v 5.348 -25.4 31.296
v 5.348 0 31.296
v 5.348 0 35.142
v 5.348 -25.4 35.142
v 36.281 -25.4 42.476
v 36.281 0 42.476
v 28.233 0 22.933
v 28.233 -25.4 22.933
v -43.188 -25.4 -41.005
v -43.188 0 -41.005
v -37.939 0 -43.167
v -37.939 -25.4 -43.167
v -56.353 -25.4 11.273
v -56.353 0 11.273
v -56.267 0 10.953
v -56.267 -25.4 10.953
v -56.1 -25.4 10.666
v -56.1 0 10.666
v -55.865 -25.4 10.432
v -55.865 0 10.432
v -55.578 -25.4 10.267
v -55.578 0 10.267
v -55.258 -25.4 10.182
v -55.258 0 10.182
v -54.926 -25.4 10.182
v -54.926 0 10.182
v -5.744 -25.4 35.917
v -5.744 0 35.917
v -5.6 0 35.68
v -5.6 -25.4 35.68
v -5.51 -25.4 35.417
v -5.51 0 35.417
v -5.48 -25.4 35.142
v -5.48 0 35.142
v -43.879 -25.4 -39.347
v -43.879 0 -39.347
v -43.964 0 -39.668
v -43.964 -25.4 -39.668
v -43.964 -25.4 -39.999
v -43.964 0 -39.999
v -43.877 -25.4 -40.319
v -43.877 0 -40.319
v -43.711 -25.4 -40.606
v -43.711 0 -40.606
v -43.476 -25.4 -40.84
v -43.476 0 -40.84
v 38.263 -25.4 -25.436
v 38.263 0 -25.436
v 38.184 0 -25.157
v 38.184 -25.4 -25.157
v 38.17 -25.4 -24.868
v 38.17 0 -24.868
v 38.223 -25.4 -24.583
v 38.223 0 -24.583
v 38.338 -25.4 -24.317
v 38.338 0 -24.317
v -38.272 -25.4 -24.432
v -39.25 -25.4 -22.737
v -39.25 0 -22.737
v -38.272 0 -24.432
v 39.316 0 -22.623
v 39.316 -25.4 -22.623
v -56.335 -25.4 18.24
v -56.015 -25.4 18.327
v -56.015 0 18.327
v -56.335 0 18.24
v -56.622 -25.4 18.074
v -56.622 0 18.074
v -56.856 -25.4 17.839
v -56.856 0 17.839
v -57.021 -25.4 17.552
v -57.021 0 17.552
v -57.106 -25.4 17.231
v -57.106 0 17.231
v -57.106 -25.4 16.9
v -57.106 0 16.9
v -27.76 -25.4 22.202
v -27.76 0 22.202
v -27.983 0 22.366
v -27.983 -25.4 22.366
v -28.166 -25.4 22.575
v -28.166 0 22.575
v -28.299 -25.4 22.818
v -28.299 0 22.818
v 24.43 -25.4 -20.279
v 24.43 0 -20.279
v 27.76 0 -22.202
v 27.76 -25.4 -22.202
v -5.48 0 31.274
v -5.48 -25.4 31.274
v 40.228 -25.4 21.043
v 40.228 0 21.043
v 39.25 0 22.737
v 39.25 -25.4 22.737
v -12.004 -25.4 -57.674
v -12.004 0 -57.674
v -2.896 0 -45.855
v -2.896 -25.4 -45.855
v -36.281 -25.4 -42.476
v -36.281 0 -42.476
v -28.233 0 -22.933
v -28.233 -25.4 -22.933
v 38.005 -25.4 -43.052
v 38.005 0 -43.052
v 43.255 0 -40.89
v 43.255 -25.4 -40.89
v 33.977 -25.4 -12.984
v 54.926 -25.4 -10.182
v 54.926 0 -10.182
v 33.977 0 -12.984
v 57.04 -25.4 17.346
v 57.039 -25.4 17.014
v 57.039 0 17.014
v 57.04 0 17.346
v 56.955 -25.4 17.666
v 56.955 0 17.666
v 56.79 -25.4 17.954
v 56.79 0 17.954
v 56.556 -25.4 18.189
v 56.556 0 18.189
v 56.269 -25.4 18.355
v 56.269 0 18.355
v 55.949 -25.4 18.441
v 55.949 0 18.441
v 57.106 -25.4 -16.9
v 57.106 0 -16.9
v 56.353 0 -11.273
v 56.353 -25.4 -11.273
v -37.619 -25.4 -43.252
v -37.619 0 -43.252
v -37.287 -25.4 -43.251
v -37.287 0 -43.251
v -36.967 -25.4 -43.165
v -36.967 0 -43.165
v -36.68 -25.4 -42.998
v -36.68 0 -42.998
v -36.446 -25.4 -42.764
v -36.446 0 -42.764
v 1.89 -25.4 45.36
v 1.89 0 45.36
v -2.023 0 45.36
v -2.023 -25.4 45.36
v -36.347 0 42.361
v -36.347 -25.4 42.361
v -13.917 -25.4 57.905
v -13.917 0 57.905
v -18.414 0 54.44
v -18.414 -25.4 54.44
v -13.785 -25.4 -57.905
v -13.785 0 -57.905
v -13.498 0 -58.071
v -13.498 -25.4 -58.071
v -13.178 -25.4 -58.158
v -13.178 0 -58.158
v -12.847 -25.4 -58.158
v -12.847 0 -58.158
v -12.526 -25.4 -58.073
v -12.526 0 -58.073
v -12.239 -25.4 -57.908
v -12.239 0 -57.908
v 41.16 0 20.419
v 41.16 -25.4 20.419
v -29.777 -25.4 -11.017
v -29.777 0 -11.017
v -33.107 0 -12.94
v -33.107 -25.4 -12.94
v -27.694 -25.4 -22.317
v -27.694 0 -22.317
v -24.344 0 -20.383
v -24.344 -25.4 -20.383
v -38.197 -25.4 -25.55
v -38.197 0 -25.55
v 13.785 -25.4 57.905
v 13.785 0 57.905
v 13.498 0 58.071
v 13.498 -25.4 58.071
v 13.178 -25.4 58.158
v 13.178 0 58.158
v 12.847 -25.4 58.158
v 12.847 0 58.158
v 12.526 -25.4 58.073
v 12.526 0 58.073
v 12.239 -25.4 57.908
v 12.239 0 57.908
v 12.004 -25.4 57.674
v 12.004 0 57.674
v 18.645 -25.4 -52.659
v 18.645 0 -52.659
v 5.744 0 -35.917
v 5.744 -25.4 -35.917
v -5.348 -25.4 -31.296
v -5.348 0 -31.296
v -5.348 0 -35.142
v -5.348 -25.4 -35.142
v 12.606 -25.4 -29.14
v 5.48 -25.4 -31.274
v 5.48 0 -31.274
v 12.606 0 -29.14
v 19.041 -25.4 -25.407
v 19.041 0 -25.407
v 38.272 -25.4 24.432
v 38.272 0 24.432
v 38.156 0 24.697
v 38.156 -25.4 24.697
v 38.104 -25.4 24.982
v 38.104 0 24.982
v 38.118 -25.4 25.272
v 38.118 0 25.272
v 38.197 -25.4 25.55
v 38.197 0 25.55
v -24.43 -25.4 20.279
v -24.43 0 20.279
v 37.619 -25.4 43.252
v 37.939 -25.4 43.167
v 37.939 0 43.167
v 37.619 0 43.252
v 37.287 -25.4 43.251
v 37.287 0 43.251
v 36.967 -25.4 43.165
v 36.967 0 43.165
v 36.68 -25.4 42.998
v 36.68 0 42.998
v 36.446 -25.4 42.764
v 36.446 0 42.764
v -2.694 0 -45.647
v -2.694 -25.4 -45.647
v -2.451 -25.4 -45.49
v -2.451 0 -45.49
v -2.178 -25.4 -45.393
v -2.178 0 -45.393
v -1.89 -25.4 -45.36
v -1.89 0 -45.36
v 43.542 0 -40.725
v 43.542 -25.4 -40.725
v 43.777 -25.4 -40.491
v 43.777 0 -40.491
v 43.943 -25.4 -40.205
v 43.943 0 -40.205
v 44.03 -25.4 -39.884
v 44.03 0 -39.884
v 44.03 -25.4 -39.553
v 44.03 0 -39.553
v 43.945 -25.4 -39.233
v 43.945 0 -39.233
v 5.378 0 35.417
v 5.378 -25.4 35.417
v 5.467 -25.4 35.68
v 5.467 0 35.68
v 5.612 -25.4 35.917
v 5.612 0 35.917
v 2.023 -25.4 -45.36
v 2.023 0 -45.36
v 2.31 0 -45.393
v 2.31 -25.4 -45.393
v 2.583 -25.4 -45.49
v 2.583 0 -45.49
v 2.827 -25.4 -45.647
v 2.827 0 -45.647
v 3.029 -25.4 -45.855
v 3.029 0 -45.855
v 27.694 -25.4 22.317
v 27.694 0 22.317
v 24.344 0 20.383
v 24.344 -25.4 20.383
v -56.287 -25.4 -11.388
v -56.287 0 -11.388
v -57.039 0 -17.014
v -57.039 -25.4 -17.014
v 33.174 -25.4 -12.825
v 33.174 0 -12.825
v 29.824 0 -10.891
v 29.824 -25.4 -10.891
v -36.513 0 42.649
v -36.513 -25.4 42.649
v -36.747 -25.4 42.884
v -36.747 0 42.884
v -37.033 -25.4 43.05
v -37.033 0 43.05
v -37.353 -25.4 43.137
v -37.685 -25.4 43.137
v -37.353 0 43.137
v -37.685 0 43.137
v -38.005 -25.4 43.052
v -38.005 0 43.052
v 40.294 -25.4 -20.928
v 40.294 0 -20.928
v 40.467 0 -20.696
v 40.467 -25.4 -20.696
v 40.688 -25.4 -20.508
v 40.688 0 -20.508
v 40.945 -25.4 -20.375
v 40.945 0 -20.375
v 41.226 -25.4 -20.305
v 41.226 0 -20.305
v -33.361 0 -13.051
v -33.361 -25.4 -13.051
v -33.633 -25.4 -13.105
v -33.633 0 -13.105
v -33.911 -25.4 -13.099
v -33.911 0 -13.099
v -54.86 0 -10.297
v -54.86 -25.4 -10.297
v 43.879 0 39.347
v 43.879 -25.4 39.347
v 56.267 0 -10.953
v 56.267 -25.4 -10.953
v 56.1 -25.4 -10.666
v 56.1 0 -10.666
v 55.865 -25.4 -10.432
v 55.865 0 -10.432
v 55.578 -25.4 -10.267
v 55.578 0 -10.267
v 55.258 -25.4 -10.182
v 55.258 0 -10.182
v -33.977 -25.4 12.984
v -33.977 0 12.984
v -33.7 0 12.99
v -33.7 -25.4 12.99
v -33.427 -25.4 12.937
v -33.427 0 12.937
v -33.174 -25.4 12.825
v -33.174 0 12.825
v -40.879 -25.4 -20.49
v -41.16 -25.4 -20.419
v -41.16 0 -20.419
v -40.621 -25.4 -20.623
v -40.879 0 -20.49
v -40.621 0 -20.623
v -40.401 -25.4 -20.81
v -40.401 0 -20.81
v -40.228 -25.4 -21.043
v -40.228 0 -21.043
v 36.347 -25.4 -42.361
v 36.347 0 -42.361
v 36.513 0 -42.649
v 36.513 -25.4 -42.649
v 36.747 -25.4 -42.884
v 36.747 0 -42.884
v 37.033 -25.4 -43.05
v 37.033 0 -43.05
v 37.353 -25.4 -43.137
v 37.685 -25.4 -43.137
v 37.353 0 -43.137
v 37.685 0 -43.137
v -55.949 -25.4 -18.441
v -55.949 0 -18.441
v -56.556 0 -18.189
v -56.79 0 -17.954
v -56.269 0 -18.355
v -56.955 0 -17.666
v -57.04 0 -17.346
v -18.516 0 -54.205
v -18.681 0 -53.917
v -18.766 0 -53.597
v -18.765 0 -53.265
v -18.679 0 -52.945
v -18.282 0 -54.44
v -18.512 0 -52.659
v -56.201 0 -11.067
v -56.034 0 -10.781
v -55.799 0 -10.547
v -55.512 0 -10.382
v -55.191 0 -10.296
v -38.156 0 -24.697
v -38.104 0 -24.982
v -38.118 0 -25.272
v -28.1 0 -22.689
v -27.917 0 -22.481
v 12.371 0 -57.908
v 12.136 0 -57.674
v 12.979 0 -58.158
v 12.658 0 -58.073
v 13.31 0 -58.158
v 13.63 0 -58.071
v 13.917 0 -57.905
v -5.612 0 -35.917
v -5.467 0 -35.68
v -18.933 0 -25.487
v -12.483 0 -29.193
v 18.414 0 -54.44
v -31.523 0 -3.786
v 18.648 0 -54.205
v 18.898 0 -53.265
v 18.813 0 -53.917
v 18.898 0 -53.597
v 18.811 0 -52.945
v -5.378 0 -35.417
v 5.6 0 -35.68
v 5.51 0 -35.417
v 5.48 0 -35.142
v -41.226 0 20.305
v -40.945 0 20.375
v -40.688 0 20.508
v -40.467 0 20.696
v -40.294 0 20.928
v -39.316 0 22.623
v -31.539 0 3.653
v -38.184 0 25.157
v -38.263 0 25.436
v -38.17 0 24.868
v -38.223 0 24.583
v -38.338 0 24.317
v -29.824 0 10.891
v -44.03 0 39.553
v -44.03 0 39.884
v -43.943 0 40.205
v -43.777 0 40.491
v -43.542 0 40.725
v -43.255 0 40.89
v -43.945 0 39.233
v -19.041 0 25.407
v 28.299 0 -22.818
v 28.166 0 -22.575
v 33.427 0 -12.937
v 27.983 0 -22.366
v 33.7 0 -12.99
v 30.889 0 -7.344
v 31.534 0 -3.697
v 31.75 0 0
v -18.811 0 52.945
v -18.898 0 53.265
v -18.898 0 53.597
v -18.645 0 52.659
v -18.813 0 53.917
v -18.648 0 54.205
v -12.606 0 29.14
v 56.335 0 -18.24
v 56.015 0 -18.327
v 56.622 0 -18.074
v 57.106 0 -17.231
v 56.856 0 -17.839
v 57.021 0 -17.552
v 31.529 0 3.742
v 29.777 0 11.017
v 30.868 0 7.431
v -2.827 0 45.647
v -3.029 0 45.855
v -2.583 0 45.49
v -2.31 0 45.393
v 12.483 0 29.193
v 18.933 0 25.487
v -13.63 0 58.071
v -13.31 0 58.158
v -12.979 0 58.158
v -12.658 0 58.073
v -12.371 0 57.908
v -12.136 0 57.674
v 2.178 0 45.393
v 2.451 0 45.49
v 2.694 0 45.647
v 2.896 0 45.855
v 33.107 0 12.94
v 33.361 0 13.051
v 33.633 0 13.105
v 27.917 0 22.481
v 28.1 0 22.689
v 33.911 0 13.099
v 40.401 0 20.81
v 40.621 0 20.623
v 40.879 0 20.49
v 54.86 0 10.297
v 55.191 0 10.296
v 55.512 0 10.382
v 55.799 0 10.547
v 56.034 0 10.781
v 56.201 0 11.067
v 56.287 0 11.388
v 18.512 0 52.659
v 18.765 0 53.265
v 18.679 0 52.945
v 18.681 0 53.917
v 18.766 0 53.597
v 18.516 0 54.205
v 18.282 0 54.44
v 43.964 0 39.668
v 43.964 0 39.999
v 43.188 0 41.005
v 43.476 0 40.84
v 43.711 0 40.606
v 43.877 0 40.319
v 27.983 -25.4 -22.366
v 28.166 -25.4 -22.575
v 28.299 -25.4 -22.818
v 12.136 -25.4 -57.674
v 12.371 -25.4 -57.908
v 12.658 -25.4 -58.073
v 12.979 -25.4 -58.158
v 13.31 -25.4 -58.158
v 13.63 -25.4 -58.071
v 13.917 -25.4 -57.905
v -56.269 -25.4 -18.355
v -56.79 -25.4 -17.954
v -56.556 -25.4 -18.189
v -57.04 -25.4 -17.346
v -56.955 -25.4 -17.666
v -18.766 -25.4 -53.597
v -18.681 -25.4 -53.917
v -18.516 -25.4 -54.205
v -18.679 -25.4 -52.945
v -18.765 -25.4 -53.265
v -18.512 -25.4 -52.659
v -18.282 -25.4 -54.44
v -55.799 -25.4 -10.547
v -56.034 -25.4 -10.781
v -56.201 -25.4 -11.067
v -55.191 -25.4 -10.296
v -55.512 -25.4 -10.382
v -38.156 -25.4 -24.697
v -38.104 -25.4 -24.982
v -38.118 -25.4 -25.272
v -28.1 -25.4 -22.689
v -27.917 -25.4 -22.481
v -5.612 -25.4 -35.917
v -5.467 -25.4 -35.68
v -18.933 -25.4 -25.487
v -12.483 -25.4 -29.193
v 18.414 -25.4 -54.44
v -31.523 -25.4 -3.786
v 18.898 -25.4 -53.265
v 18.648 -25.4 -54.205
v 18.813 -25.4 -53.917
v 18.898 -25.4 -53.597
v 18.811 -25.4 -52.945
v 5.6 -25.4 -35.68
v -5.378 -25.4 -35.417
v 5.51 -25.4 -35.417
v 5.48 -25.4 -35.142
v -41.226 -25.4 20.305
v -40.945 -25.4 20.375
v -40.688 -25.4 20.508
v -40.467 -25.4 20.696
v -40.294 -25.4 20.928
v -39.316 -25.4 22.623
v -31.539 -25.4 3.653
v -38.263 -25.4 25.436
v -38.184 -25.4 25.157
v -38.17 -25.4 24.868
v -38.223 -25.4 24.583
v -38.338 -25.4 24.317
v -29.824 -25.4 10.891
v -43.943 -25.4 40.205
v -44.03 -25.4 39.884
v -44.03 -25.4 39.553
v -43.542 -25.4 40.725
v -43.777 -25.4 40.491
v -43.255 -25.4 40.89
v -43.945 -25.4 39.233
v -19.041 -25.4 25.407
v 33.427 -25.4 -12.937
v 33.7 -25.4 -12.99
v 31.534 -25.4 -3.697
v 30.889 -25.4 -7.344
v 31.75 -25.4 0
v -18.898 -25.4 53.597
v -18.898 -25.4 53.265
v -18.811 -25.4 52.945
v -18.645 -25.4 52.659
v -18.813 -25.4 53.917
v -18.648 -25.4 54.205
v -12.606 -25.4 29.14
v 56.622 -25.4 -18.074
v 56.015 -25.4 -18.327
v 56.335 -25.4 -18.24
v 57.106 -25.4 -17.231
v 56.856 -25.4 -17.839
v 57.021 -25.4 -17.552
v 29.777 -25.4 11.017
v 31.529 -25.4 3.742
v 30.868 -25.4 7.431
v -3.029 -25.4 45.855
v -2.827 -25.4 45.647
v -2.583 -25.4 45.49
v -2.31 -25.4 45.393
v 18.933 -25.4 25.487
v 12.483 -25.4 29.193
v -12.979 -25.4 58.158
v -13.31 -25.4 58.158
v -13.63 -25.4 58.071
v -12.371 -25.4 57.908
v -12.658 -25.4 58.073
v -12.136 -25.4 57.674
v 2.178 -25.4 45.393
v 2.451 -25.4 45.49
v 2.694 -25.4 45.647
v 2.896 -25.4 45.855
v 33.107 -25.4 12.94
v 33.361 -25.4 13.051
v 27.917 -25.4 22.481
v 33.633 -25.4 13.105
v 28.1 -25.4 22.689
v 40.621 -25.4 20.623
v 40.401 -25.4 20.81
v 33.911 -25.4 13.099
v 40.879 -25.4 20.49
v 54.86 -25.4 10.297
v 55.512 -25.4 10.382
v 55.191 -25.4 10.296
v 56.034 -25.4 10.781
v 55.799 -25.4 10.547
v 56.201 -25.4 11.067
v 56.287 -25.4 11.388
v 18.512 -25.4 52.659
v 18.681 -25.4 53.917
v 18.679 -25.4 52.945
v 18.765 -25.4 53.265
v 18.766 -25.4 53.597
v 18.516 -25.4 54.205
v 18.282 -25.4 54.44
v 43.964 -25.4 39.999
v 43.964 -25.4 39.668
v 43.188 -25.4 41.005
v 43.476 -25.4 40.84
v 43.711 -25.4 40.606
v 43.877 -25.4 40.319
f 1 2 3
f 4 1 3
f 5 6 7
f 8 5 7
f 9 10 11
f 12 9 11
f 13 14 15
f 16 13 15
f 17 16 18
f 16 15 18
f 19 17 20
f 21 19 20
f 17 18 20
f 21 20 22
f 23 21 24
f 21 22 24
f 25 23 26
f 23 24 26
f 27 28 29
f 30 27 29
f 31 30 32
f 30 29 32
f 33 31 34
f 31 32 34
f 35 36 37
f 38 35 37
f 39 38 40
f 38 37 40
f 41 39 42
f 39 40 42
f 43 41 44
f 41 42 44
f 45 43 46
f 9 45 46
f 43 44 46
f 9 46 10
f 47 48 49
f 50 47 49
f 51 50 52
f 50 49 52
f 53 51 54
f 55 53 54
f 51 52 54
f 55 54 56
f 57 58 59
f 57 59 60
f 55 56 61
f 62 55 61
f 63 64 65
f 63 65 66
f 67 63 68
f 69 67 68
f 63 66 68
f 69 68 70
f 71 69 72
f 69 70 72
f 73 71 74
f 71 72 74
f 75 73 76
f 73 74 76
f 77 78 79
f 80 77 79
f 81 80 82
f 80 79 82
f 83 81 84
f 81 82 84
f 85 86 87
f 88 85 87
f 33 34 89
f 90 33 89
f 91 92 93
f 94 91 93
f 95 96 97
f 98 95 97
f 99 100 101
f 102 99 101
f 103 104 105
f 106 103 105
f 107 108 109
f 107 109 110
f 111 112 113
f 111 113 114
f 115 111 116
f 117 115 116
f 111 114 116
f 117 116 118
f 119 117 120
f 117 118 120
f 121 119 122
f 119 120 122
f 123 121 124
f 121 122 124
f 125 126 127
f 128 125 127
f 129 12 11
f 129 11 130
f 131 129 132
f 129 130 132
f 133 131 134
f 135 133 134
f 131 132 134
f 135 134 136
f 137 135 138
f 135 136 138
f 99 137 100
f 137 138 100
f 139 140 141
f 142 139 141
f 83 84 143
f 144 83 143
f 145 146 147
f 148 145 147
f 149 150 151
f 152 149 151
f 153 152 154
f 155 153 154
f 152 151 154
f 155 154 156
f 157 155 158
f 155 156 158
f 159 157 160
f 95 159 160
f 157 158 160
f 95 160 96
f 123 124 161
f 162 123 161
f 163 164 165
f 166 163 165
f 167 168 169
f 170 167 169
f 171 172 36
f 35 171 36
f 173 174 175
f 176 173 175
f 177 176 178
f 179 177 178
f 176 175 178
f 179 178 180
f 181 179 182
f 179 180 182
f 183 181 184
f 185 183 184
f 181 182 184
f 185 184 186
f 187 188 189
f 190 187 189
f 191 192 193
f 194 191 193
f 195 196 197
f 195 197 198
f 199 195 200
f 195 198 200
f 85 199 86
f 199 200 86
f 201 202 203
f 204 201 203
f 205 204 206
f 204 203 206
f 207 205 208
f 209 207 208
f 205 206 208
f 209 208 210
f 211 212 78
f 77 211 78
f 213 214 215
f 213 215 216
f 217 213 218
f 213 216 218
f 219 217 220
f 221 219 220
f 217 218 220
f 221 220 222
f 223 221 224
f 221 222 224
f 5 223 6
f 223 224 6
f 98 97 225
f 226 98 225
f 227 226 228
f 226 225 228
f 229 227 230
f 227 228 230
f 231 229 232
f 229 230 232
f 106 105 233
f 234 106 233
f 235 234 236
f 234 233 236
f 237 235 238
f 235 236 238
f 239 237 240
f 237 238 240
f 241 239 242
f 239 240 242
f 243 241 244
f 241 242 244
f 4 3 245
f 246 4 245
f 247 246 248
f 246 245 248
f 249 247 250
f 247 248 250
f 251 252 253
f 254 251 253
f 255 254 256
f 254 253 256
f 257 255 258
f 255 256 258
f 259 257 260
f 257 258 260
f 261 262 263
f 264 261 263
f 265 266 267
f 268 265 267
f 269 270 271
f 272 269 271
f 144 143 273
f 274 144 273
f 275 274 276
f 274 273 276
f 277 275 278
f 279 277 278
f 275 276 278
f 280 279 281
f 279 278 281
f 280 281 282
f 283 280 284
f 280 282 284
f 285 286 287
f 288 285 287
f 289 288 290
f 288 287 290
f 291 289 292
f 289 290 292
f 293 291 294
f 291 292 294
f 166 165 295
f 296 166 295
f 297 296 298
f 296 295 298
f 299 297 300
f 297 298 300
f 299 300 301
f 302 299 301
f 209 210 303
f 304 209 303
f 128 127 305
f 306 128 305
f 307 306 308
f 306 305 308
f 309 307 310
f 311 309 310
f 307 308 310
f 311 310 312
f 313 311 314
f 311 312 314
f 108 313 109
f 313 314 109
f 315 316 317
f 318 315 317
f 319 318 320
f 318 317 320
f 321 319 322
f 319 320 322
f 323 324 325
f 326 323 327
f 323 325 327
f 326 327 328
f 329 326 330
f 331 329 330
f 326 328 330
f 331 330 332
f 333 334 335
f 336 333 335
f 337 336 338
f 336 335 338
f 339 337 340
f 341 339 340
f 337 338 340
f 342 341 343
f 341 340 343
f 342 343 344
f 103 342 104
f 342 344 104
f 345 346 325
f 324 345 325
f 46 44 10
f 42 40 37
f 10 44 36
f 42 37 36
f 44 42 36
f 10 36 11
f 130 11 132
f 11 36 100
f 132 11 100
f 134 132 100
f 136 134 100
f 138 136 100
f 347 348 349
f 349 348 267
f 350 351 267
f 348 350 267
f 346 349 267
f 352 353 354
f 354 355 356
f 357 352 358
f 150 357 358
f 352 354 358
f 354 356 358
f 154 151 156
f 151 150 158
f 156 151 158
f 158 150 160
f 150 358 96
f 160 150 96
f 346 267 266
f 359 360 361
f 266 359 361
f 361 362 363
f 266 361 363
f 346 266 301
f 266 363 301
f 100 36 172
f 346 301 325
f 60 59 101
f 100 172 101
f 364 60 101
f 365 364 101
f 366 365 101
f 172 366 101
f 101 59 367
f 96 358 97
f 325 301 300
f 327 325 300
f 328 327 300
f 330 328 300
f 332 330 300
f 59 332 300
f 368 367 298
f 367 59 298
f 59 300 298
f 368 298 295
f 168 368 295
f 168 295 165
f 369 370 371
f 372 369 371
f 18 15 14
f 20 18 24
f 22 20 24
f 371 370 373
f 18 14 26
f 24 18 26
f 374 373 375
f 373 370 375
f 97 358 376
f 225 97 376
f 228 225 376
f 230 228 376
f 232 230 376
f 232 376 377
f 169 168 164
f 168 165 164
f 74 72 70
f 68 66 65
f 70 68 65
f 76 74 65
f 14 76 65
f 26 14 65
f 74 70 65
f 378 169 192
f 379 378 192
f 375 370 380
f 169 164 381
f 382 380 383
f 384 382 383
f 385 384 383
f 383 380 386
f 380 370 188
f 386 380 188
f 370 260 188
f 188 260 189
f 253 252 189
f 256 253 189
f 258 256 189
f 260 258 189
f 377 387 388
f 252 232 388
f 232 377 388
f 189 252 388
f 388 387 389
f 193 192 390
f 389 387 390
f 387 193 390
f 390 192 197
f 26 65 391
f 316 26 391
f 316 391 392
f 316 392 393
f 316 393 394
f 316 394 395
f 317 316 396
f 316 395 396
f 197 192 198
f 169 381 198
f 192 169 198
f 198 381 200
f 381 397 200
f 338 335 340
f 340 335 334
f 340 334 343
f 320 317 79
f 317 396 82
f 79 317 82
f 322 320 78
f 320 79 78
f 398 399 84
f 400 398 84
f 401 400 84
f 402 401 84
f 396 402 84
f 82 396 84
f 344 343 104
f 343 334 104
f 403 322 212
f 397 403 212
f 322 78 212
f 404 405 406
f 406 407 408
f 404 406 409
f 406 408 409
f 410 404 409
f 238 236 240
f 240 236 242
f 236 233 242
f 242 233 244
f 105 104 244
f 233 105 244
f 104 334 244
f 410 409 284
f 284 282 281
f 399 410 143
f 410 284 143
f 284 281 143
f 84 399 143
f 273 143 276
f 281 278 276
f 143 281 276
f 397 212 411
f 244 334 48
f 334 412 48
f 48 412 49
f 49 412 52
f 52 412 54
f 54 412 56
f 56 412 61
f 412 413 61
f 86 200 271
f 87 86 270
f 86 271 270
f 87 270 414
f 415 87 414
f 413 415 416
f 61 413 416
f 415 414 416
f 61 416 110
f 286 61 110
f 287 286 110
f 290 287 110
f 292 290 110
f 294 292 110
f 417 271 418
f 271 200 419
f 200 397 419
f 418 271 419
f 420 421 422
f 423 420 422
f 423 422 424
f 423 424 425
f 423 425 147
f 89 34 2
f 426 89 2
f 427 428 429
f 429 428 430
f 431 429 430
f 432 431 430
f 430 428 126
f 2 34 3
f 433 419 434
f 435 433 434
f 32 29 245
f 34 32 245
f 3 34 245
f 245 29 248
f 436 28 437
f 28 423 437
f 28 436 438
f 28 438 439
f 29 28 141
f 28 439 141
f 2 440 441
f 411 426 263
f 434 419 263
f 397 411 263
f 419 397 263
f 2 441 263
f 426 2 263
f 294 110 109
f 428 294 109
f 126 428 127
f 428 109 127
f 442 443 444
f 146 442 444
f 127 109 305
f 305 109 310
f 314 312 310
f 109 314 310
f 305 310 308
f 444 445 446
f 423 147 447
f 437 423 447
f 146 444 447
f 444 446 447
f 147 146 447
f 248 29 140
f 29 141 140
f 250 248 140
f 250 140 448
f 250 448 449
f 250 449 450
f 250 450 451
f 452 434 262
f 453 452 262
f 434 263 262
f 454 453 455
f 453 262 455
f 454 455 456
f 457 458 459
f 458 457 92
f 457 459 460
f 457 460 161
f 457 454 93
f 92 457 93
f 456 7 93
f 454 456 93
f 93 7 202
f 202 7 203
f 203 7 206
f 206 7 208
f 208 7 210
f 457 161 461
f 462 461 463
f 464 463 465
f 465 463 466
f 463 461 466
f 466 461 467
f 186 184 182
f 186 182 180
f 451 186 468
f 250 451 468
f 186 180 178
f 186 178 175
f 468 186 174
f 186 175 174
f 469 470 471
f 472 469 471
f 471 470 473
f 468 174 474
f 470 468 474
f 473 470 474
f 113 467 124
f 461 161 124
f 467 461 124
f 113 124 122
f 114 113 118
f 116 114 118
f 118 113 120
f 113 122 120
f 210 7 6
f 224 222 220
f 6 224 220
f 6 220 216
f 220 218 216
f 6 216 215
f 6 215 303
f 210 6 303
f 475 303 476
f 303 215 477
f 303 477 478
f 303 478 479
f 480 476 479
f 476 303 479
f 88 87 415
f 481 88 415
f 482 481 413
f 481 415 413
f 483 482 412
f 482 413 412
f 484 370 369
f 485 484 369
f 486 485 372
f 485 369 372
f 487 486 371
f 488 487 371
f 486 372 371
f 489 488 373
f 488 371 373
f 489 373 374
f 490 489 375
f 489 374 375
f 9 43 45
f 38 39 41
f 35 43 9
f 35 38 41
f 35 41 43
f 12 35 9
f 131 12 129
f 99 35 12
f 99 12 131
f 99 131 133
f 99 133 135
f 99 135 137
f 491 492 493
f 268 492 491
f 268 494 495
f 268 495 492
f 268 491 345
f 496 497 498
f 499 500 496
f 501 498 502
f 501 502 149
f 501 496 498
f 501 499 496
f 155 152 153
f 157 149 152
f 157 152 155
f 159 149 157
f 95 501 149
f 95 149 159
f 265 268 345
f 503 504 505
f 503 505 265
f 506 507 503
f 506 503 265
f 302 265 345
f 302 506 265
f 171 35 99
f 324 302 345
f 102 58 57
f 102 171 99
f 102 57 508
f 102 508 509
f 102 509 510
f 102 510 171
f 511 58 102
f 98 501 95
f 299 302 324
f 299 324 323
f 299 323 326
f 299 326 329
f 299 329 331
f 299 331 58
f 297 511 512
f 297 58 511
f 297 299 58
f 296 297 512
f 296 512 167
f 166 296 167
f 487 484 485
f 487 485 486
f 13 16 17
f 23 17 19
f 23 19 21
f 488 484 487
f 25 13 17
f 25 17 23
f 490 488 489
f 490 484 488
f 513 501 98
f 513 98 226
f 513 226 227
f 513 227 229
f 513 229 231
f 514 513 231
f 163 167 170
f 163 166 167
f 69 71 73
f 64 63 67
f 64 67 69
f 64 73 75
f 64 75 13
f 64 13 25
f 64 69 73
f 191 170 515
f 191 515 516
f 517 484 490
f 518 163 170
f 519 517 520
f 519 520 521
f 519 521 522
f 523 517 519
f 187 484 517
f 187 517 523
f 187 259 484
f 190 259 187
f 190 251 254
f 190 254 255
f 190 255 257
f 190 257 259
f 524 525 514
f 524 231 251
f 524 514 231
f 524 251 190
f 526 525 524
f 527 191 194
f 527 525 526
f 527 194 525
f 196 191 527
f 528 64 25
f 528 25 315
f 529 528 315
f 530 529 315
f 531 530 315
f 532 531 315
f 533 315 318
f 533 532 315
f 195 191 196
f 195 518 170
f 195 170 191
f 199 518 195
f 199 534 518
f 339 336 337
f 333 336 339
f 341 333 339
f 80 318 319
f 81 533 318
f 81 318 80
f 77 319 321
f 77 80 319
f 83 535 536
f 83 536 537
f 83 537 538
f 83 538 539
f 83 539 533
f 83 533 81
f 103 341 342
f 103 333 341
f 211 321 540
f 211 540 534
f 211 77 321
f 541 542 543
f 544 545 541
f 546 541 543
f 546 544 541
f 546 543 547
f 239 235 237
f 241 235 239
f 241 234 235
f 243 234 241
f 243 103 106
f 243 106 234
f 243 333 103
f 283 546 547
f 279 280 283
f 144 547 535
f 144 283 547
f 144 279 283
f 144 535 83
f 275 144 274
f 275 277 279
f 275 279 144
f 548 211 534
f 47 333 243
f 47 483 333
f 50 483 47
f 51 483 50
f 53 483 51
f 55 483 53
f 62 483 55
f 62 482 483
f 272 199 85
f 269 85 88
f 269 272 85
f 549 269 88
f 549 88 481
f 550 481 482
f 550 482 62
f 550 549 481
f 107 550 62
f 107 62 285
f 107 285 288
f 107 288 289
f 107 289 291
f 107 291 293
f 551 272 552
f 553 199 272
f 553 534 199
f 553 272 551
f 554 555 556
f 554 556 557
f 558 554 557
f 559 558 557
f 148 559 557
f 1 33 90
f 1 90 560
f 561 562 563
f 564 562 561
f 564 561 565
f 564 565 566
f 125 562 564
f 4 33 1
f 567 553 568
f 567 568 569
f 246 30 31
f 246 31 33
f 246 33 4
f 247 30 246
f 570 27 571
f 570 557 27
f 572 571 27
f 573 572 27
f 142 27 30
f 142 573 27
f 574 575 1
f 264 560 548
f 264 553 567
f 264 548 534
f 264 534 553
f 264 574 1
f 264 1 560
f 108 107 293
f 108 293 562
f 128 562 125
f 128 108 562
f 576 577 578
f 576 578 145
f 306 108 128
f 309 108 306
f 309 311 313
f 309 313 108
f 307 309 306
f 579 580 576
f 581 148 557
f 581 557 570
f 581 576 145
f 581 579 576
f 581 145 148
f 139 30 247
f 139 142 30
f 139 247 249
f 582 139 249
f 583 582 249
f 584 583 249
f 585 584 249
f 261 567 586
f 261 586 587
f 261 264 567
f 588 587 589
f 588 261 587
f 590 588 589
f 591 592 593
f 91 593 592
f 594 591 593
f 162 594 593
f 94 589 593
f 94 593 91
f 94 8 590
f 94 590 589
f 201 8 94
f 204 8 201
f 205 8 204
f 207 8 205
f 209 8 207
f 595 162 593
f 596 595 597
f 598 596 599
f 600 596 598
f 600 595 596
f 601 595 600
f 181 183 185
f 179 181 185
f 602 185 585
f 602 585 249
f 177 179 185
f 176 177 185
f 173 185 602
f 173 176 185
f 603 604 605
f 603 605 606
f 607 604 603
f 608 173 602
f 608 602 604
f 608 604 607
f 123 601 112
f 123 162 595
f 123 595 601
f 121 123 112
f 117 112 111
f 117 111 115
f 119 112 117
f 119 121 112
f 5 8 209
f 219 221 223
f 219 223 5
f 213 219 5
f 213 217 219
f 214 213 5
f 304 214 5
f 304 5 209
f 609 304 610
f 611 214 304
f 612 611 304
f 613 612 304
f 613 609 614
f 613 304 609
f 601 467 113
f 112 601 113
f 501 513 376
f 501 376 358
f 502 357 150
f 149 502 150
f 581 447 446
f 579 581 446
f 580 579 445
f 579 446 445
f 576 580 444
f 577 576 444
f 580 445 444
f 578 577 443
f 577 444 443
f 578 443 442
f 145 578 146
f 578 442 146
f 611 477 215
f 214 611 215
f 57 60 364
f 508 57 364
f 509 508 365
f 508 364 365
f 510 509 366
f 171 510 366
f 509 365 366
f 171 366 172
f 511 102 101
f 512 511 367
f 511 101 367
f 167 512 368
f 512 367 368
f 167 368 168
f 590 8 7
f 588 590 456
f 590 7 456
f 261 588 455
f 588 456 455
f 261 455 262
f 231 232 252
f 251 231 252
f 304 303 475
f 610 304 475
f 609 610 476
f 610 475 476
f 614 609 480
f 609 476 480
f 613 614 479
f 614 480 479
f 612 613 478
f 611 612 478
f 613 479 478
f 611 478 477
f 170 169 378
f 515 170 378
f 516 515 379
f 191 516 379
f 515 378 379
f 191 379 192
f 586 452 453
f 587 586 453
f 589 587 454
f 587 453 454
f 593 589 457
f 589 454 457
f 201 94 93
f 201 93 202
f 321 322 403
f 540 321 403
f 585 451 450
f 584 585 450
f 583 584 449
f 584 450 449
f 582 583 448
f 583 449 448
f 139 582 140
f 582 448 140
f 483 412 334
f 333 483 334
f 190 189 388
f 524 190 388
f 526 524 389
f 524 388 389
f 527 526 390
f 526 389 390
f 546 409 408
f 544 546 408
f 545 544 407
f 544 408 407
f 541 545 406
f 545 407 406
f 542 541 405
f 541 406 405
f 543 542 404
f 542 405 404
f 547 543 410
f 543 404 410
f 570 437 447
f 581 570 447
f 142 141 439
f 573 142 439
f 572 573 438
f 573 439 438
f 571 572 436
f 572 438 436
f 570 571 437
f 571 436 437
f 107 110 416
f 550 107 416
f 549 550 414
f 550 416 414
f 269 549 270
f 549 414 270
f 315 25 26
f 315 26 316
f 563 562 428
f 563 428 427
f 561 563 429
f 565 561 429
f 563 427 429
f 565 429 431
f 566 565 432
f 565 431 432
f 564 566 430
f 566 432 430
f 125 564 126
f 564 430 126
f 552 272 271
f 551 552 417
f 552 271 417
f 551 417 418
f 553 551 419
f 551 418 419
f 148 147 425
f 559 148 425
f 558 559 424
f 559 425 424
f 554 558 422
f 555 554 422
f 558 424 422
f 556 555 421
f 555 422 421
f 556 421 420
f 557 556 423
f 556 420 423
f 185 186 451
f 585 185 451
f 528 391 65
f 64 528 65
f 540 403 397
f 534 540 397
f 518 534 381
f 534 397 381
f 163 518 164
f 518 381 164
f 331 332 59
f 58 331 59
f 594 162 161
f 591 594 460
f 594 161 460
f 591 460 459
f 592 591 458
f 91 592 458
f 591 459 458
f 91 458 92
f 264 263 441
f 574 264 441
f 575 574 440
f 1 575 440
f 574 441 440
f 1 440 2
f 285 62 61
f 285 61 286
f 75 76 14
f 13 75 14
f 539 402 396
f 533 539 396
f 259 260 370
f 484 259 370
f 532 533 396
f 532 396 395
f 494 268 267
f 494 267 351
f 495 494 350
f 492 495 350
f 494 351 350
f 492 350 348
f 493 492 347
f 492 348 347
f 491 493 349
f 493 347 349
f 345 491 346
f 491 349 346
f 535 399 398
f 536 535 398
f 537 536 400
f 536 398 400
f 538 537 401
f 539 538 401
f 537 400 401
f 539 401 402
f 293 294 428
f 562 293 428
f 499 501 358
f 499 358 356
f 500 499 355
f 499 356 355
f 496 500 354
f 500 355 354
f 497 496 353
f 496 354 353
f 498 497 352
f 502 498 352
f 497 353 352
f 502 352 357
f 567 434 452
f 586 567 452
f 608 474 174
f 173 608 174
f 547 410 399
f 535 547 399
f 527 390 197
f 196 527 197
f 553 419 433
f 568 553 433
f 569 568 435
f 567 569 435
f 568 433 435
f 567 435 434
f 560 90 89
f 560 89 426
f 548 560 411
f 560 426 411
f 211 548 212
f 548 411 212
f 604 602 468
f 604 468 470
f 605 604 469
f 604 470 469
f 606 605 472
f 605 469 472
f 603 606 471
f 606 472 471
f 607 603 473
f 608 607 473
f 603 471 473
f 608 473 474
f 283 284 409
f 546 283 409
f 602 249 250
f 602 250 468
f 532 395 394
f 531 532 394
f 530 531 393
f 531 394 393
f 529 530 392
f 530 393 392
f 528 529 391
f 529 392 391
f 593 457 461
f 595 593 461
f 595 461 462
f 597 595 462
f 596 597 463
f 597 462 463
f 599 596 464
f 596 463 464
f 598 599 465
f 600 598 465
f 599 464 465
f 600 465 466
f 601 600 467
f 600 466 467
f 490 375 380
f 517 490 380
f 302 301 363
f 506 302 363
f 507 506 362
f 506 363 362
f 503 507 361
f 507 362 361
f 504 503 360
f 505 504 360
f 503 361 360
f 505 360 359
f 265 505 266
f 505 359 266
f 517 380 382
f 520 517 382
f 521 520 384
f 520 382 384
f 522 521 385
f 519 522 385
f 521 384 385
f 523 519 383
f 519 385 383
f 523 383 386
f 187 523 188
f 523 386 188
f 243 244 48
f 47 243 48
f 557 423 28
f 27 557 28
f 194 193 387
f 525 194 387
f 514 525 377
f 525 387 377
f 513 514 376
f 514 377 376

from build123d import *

# Parameters (mm, degrees)
F1_DEPTH = 25.4


# Not quite as in the source:
# - a feature names something its author has since deleted; it is built from what else it names


with BuildPart() as f1:
    # F0 (on Front) → F1 (new body)
    with BuildSketch(Plane.XZ):
        with BuildLine():
            ThreePointArc((29.8236565437, -10.8909141198), (31.2647053022, -5.529982131), (31.75, 0))
            ThreePointArc((31.75, 0), (31.2529370271, 5.5961082175), (29.7773116736, 11.0169963917))
            ThreePointArc((29.7773116736, 11.0169963917), (27.4626625114, 15.9331311356), (24.34363657, 20.3825871407))
            ThreePointArc((24.34363657, 20.3825871407), (15.8167978227, 27.529827581), (5.3476570882, 31.2964065616))
            ThreePointArc((5.3476570882, 31.2964065616), (-0.0671650695, 31.7499289582), (-5.4800199737, 31.2735012605))
            ThreePointArc((-5.4800199737, 31.2735012605), (-15.9331311356, 27.4626625114), (-24.4296545854, 20.2794101699))
            ThreePointArc((-24.4296545854, 20.2794101699), (-27.529827581, 15.8167978227), (-29.8236565437, 10.8909141198))
            ThreePointArc((-29.8236565437, 10.8909141198), (-31.7499289582, -0.0671650695), (-29.7773116736, -11.0169963917))
            ThreePointArc((-29.7773116736, -11.0169963917), (-27.4626625114, -15.9331311356), (-24.34363657, -20.3825871407))
            ThreePointArc((-24.34363657, -20.3825871407), (-15.8167978227, -27.529827581), (-5.3476570882, -31.2964065616))
            ThreePointArc((-5.3476570882, -31.2964065616), (0.0671650695, -31.7499289582), (5.4800199737, -31.2735012605))
            ThreePointArc((5.4800199737, -31.2735012605), (15.9331311356, -27.4626625114), (24.4296545854, -20.2794101699))
            ThreePointArc((24.4296545854, -20.2794101699), (27.529827581, -15.8167978227), (29.8236565437, -10.8909141198))
        make_face()
        with BuildLine():
            ThreePointArc((-29.8236565437, 10.8909141198), (-27.529827581, 15.8167978227), (-24.4296545854, 20.2794101699))
            Line((-24.4296545854, 20.2794101699), (-27.7596928163, 22.2020086389))
            ThreePointArc((-27.7596928163, 22.2020086389), (-28.0803819304, 22.4654648728), (-28.2990076095, 22.8182445595))
            Line((-28.2990076095, 22.8182445595), (-36.3474772559, 42.3614984651))
            ThreePointArc((-36.3474772559, 42.3614984651), (-37.0333944907, 43.0502164715), (-38.0054083913, 43.0521969161))
            Line((-38.0054083913, 43.0521969161), (-43.2545602789, 40.8904463786))
            ThreePointArc((-43.2545602789, 40.8904463786), (-43.9432782853, 40.2045291438), (-43.9452587299, 39.2325152431))
            Line((-43.9452587299, 39.2325152431), (-38.2633402939, 25.4357091987))
            ThreePointArc((-38.2633402939, 25.4357091987), (-38.17045953, 24.8677399071), (-38.3378028243, 24.3170928565))
            Line((-38.3378028243, 24.3170928565), (-39.3160529196, 22.622713989))
            Line((-39.3160529196, 22.622713989), (-40.2943030148, 20.9283351216))
            ThreePointArc((-40.2943030148, 20.9283351216), (-40.687505702, 20.5080880523), (-41.225821919, 20.3045405075))
            Line((-41.225821919, 20.3045405075), (-56.0151656626, 18.3268231931))
            ThreePointArc((-56.0151656626, 18.3268231931), (-56.8559641711, 17.8391011274), (-57.1056269181, 16.8996952205))
            Line((-57.1056269181, 16.8996952205), (-56.3531818565, 11.2729210687))
            ThreePointArc((-56.3531818565, 11.2729210687), (-55.8654597908, 10.4321225602), (-54.9260538839, 10.1824598132))
            Line((-54.9260538839, 10.1824598132), (-33.9768647058, 12.9839075907))
            ThreePointArc((-33.9768647058, 12.9839075907), (-33.5620356955, 12.970962042), (-33.1735313472, 12.8249652394))
            Line((-33.1735313472, 12.8249652394), (-29.8236565437, 10.8909141198))
        make_face()
        with BuildLine():
            ThreePointArc((-5.4800199737, 31.2735012605), (-0.0671650695, 31.7499289582), (5.3476570882, 31.2964065616))
            Line((5.3476570882, 31.2964065616), (5.3476570882, 35.1416034996))
            ThreePointArc((5.3476570882, 35.1416034996), (5.4154723224, 35.551056536), (5.6116756536, 35.9167817715))
            Line((5.6116756536, 35.9167817715), (18.5123951852, 52.6585878997))
            ThreePointArc((18.5123951852, 52.6585878997), (18.7658838574, 53.596968653), (18.2815920225, 54.4397476062))
            Line((18.2815920225, 54.4397476062), (13.7848851965, 57.9047712204))
            ThreePointArc((13.7848851965, 57.9047712204), (12.8465044431, 58.1582598926), (12.00372549, 57.6739680576))
            Line((12.00372549, 57.6739680576), (2.8963001824, 45.8548793275))
            ThreePointArc((2.8963001824, 45.8548793275), (2.4508647292, 45.4904575807), (1.8903187477, 45.3600575994))
            Line((1.8903187477, 45.3600575994), (-0.0661814427, 45.3600575994))
            Line((-0.0661814427, 45.3600575994), (-2.0226816332, 45.3600575994))
            ThreePointArc((-2.0226816332, 45.3600575994), (-2.5832276147, 45.4904575807), (-3.0286630678, 45.8548793275))
            Line((-3.0286630678, 45.8548793275), (-12.1360883754, 57.6739680576))
            ThreePointArc((-12.1360883754, 57.6739680576), (-12.9788673285, 58.1582598926), (-13.9172480819, 57.9047712204))
            Line((-13.9172480819, 57.9047712204), (-18.4139549079, 54.4397476062))
            ThreePointArc((-18.4139549079, 54.4397476062), (-18.8982467429, 53.596968653), (-18.6447580707, 52.6585878997))
            Line((-18.6447580707, 52.6585878997), (-5.744038539, 35.9167817715))
            ThreePointArc((-5.744038539, 35.9167817715), (-5.5478352079, 35.551056536), (-5.4800199737, 35.1416034996))
            Line((-5.4800199737, 35.1416034996), (-5.4800199737, 31.2735012605))
        make_face()
        with BuildLine():
            ThreePointArc((24.34363657, 20.3825871407), (27.4626625114, 15.9331311356), (29.7773116736, 11.0169963917))
            Line((29.7773116736, 11.0169963917), (33.1073499045, 12.9395948607))
            ThreePointArc((33.1073499045, 12.9395948607), (33.4958542528, 13.0855916633), (33.9106832631, 13.098537212))
            Line((33.9106832631, 13.098537212), (54.8598724411, 10.2970894345))
            ThreePointArc((54.8598724411, 10.2970894345), (55.7992783481, 10.5467521815), (56.2870004138, 11.38755069))
            Line((56.2870004138, 11.38755069), (57.0394454754, 17.0143248418))
            ThreePointArc((57.0394454754, 17.0143248418), (56.7897827284, 17.9537307487), (55.9489842199, 18.4414528144))
            Line((55.9489842199, 18.4414528144), (41.1596404763, 20.4191701289))
            ThreePointArc((41.1596404763, 20.4191701289), (40.6213242593, 20.6227176736), (40.2281215721, 21.0429647429))
            Line((40.2281215721, 21.0429647429), (39.2498714768, 22.7373436104))
            Line((39.2498714768, 22.7373436104), (38.2716213816, 24.4317224778))
            ThreePointArc((38.2716213816, 24.4317224778), (38.1042780873, 24.9823695284), (38.1971588512, 25.55033882))
            Line((38.1971588512, 25.55033882), (43.8790772872, 39.3471448645))
            ThreePointArc((43.8790772872, 39.3471448645), (43.8770968426, 40.3191587651), (43.1883788362, 41.0050759999))
            Line((43.1883788362, 41.0050759999), (37.9392269486, 43.1668265375))
            ThreePointArc((37.9392269486, 43.1668265375), (36.9672130479, 43.1648460928), (36.2812958132, 42.4761280865))
            Line((36.2812958132, 42.4761280865), (28.2328261668, 22.9328741809))
            ThreePointArc((28.2328261668, 22.9328741809), (28.0142004876, 22.5800944941), (27.6935113736, 22.3166382603))
            Line((27.6935113736, 22.3166382603), (24.34363657, 20.3825871407))
        make_face()
        with BuildLine():
            Line((33.1735313472, -12.8249652394), (29.8236565437, -10.8909141198))
            ThreePointArc((29.8236565437, -10.8909141198), (27.529827581, -15.8167978227), (24.4296545854, -20.2794101699))
            Line((24.4296545854, -20.2794101699), (27.7596928163, -22.2020086389))
            ThreePointArc((27.7596928163, -22.2020086389), (28.0803819304, -22.4654648728), (28.2990076095, -22.8182445595))
            Line((28.2990076095, -22.8182445595), (36.3474772559, -42.3614984651))
            ThreePointArc((36.3474772559, -42.3614984651), (37.0333944907, -43.0502164715), (38.0054083913, -43.0521969161))
            Line((38.0054083913, -43.0521969161), (43.2545602789, -40.8904463786))
            ThreePointArc((43.2545602789, -40.8904463786), (43.9432782853, -40.2045291438), (43.9452587299, -39.2325152431))
            Line((43.9452587299, -39.2325152431), (38.2633402939, -25.4357091987))
            ThreePointArc((38.2633402939, -25.4357091987), (38.17045953, -24.8677399071), (38.3378028243, -24.3170928565))
            Line((38.3378028243, -24.3170928565), (39.3160529196, -22.622713989))
            Line((39.3160529196, -22.622713989), (40.2943030148, -20.9283351216))
            ThreePointArc((40.2943030148, -20.9283351216), (40.687505702, -20.5080880523), (41.225821919, -20.3045405075))
            Line((41.225821919, -20.3045405075), (56.0151656626, -18.3268231931))
            ThreePointArc((56.0151656626, -18.3268231931), (56.8559641711, -17.8391011274), (57.1056269181, -16.8996952205))
            Line((57.1056269181, -16.8996952205), (56.3531818565, -11.2729210687))
            ThreePointArc((56.3531818565, -11.2729210687), (55.8654597908, -10.4321225602), (54.9260538839, -10.1824598132))
            Line((54.9260538839, -10.1824598132), (33.9768647058, -12.9839075907))
            ThreePointArc((33.9768647058, -12.9839075907), (33.5620356955, -12.970962042), (33.1735313472, -12.8249652394))
        make_face()
        with BuildLine():
            Line((5.4800199737, -35.1416034996), (5.4800199737, -31.2735012605))
            ThreePointArc((5.4800199737, -31.2735012605), (0.0671650695, -31.7499289582), (-5.3476570882, -31.2964065616))
            Line((-5.3476570882, -31.2964065616), (-5.3476570882, -35.1416034996))
            ThreePointArc((-5.3476570882, -35.1416034996), (-5.4154723224, -35.551056536), (-5.6116756536, -35.9167817715))
            Line((-5.6116756536, -35.9167817715), (-18.5123951852, -52.6585878997))
            ThreePointArc((-18.5123951852, -52.6585878997), (-18.7658838574, -53.596968653), (-18.2815920225, -54.4397476062))
            Line((-18.2815920225, -54.4397476062), (-13.7848851965, -57.9047712204))
            ThreePointArc((-13.7848851965, -57.9047712204), (-12.8465044431, -58.1582598926), (-12.00372549, -57.6739680576))
            Line((-12.00372549, -57.6739680576), (-2.8963001824, -45.8548793275))
            ThreePointArc((-2.8963001824, -45.8548793275), (-2.4508647292, -45.4904575807), (-1.8903187477, -45.3600575994))
            Line((-1.8903187477, -45.3600575994), (0.0661814427, -45.3600575994))
            Line((0.0661814427, -45.3600575994), (2.0226816332, -45.3600575994))
            ThreePointArc((2.0226816332, -45.3600575994), (2.5832276147, -45.4904575807), (3.0286630678, -45.8548793275))
            Line((3.0286630678, -45.8548793275), (12.1360883754, -57.6739680576))
            ThreePointArc((12.1360883754, -57.6739680576), (12.9788673285, -58.1582598926), (13.9172480819, -57.9047712204))
            Line((13.9172480819, -57.9047712204), (18.4139549079, -54.4397476062))
            ThreePointArc((18.4139549079, -54.4397476062), (18.8982467429, -53.596968653), (18.6447580707, -52.6585878997))
            Line((18.6447580707, -52.6585878997), (5.744038539, -35.9167817715))
            ThreePointArc((5.744038539, -35.9167817715), (5.5478352079, -35.551056536), (5.4800199737, -35.1416034996))
        make_face()
        with BuildLine():
            Line((-27.6935113736, -22.3166382603), (-24.34363657, -20.3825871407))
            ThreePointArc((-24.34363657, -20.3825871407), (-27.4626625114, -15.9331311356), (-29.7773116736, -11.0169963917))
            Line((-29.7773116736, -11.0169963917), (-33.1073499045, -12.9395948607))
            ThreePointArc((-33.1073499045, -12.9395948607), (-33.4958542528, -13.0855916633), (-33.9106832631, -13.098537212))
            Line((-33.9106832631, -13.098537212), (-54.8598724411, -10.2970894345))
            ThreePointArc((-54.8598724411, -10.2970894345), (-55.7992783481, -10.5467521815), (-56.2870004138, -11.38755069))
            Line((-56.2870004138, -11.38755069), (-57.0394454754, -17.0143248418))
            ThreePointArc((-57.0394454754, -17.0143248418), (-56.7897827284, -17.9537307487), (-55.9489842199, -18.4414528144))
            Line((-55.9489842199, -18.4414528144), (-41.1596404763, -20.4191701289))
            ThreePointArc((-41.1596404763, -20.4191701289), (-40.6213242593, -20.6227176736), (-40.2281215721, -21.0429647429))
            Line((-40.2281215721, -21.0429647429), (-39.2498714768, -22.7373436104))
            Line((-39.2498714768, -22.7373436104), (-38.2716213816, -24.4317224778))
            ThreePointArc((-38.2716213816, -24.4317224778), (-38.1042780873, -24.9823695284), (-38.1971588512, -25.55033882))
            Line((-38.1971588512, -25.55033882), (-43.8790772872, -39.3471448645))
            ThreePointArc((-43.8790772872, -39.3471448645), (-43.8770968426, -40.3191587651), (-43.1883788362, -41.0050759999))
            Line((-43.1883788362, -41.0050759999), (-37.9392269486, -43.1668265375))
            ThreePointArc((-37.9392269486, -43.1668265375), (-36.9672130479, -43.1648460928), (-36.2812958132, -42.4761280865))
            Line((-36.2812958132, -42.4761280865), (-28.2328261668, -22.9328741809))
            ThreePointArc((-28.2328261668, -22.9328741809), (-28.0142004876, -22.5800944941), (-27.6935113736, -22.3166382603))
        make_face()
    extrude(amount=F1_DEPTH)


solid = f1.part
